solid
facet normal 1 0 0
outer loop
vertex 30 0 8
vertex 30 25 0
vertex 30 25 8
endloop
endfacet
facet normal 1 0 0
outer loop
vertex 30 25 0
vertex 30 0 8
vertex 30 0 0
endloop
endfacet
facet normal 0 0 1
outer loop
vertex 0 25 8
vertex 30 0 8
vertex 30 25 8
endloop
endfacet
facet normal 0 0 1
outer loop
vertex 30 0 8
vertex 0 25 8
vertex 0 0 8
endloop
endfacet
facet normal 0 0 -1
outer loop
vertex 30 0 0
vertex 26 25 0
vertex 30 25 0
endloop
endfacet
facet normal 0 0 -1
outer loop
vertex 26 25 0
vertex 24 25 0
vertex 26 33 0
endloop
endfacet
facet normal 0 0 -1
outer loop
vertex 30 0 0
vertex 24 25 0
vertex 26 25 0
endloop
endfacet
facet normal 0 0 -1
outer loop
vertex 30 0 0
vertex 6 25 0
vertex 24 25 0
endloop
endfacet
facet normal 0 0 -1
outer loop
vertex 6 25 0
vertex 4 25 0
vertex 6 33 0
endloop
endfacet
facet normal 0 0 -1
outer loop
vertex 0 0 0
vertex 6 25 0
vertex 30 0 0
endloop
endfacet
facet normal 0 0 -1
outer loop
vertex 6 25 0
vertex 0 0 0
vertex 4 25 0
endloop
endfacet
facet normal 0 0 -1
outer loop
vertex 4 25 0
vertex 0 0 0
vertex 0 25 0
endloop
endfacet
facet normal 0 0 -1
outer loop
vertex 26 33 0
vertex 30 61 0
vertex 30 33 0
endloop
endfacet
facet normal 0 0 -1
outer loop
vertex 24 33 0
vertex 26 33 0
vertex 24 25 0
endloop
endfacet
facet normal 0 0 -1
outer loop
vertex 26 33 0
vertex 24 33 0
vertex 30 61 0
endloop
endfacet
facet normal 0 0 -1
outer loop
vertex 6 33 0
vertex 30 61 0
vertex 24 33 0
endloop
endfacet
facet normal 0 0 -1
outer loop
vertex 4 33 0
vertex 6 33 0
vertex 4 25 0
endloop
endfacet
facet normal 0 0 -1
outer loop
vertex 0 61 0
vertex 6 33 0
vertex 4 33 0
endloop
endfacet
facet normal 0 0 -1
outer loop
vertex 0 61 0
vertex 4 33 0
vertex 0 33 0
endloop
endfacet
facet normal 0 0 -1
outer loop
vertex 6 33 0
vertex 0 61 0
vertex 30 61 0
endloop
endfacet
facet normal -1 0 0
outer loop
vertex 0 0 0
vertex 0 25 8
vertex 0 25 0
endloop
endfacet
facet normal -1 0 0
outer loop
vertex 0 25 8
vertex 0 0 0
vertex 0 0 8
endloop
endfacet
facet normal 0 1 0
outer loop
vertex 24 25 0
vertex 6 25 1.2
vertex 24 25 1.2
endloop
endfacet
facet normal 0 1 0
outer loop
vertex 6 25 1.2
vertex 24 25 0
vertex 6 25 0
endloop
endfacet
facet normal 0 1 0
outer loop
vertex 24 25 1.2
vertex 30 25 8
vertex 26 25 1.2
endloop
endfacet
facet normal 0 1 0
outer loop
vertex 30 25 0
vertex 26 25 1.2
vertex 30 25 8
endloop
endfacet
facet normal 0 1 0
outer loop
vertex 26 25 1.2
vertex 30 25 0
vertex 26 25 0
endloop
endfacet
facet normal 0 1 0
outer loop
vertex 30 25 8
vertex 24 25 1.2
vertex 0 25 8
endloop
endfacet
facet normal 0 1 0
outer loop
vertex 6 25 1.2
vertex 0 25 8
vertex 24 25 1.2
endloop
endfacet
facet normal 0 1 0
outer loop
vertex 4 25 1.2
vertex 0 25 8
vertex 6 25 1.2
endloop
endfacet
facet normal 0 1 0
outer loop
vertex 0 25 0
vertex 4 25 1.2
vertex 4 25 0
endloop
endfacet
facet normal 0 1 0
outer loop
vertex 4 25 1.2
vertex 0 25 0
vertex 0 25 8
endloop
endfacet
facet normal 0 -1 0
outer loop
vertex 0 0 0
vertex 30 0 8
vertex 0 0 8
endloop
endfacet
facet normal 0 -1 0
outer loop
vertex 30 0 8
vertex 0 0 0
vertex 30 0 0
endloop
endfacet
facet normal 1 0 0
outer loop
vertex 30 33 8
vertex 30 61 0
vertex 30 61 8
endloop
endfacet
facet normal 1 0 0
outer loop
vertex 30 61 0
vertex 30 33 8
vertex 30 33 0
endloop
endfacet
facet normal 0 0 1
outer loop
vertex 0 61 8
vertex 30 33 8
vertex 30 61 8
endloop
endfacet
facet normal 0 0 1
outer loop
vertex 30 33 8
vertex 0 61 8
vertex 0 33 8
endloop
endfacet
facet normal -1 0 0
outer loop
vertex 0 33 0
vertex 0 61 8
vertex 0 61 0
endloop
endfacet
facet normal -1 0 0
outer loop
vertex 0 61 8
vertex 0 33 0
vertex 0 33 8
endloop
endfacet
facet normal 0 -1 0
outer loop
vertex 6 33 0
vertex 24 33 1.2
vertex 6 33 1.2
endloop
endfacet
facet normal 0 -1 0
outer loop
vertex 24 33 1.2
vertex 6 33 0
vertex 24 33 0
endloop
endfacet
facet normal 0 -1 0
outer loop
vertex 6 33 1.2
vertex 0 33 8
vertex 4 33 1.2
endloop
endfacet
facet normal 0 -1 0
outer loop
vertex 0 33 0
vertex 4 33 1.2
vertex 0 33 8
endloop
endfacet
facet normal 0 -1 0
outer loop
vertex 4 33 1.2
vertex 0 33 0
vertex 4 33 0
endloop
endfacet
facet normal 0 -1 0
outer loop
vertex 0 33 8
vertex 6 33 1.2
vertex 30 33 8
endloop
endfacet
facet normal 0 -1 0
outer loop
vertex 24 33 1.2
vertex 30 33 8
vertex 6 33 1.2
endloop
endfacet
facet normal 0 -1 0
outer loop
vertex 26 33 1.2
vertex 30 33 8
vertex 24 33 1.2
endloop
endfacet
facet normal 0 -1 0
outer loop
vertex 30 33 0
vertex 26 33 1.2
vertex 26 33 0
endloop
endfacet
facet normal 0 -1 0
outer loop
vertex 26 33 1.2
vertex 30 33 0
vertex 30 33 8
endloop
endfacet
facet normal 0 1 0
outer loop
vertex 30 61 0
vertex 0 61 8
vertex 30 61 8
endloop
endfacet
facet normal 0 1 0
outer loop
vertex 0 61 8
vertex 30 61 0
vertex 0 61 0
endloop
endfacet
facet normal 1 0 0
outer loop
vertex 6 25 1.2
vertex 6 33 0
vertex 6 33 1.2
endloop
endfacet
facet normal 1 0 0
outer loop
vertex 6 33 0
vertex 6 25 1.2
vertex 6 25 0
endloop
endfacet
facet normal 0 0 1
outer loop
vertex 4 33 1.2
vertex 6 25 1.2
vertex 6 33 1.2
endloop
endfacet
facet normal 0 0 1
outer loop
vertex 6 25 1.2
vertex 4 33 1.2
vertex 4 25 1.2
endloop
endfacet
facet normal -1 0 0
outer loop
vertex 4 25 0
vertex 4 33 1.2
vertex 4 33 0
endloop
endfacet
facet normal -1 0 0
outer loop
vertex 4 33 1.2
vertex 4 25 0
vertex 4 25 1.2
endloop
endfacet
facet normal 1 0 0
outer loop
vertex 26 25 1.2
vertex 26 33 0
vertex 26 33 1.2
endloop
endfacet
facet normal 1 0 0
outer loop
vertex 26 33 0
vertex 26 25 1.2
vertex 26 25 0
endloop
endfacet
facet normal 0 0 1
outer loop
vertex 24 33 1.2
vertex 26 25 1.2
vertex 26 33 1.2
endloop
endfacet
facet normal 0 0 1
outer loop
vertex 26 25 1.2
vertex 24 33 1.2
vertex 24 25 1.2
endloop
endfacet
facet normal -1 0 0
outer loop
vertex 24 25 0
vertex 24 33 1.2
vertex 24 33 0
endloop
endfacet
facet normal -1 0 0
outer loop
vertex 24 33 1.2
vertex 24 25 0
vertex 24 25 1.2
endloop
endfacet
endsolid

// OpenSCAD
// Grass infinity wall - a tiled cyclorama for the lens saucer to hover over,
// with a half-formed crop circle pressed into it.
//
// THIS IS A TILED SET, NOT ONE OBJECT. At 300mm wide it is:
//   3x floor_tile   100 x 200 x 8      flat, trivial, huge first layer
//   3x cove_tile    100 x  70 x 130    the curve, solid, hollowed from below
//   1x seam_gauge   print FIRST - tests the tongue-and-groove fit
//
//   openscad --render -D 'part="seam_gauge"' -o gw_seam_gauge.stl infinity_wall.scad
//   openscad --render -D 'part="floor_tile"' -D tile=0 -o gw_floor_0.raw.stl infinity_wall.scad
//
// The floor tiles come out SMOOTH. The supplied gw_floor_N.stl also carry a
// grass texture over the standing crop, added afterwards in Blender by grass.py.
//
// view_assembly is a PICTURE.
//
// WHY TWO ROWS AND NOT ONE CURVE
//
// The saucer is 138mm across, so the floor has to be about 200mm deep for it
// to sit on with any foreground. 200 + a 70mm cove is 270mm, past the P1S's
// ~230mm practical bed - the corner exclusion zones refused a 240mm frame
// before. Splitting at the TANGENT costs one seam and buys the whole set:
// there is no visual feature at the tangent, the grass texture crosses it, and
// each row then prints in its own best orientation.
//
// WHY THE COVE IS SOLID AND NOT A SHELL
//
// The cove's underside sweeps from 0 to 90 degrees. A constant-thickness sheet
// would be a 90-degree overhang at the tangent - unprintable, and not the
// bridging kind: nothing is anchored on the far side. As a solid wedge sitting
// flat on the plate the same surface is the TOP, which costs nothing. It is
// then hollowed from beneath, where the cavity ceiling IS anchored both sides
// and bridges: a ceiling held at both ends prints, a cantilever does not.
//
// SHOT FROM ABOVE, WHICH CHANGES TWO THINGS.
//
// The cove row does nothing. An infinity curve exists to hide the horizon when
// the camera is low; from overhead the frame is floor and the wall is never
// seen. It is also 59% of the material and the three tallest parts, so the
// floor row alone is the print. cove_tile stays here for a low-angle shot.
//
// AND DEPTH ALONE WILL NOT READ. The reference is an aerial photograph and the
// formation shows up there by TONE - pale laid crop against golden standing
// crop - not by shadow. Straight down under soft light, a 2.5mm step casts
// almost none. So the contrast has to be COLOUR:
//
//     CHANGE FILAMENT AT Z = plate_t - crop_depth = 5.6mm
//
// Below it is laid crop, above it is standing crop. ONE swap at one layer,
// not the 16 that turned an 8g part into 20g - that warning is about colour
// changes per layer, and this is a single purge. Free on the H2D's two nozzles.
//
// THE FORMATION, from the reference: a hexagonal rosette. Six large
// overlapping circles around a small spoked hub, each carrying an angular
// meander glyph, with tractor tramlines crossing the field. Half-formed, so
// the glyphs stop partway round and the last circle is an empty outline.

part = "seam_gauge";  // seam_gauge | floor_tile | cove_tile | view_assembly
tile = 0;             // WHICH tile: 0..n_tiles-1. The formation spans the
                      // whole set, so a tile has to know where it sits or the
                      // pattern lands on all three in the same place.

layer_h = 0.2;
$fn     = 128;

// -------------------------------------------------------------- the subject
saucer_d  = 138;            // the saucer this set was built for, across its rim
saucer_h  = 40;

// ----------------------------------------------------------------- the set
set_w     = 300;            // total width, across all tiles
n_tiles   = 3;
tile_w    = set_w / n_tiles;

floor_d   = 200;            // deep enough for the saucer plus foreground
cove_r    = 70;             // blend radius: the "infinity" part
wall_h    = 60;             // vertical wall above the cove

plate_t   = 8;              // floor tile thickness
shell_t   = 6;              // cove tile skin over its cavity
rib_every = 40;             // ribs break the cavity ceiling into short bridges

// ------------------------------------------------------------- the seams
// Tongue and groove on the VERTICAL side faces. Vertical in both tiles' print
// orientations, so neither is an overhang. Loose on purpose - this is a set
// that gets assembled and pulled apart on a shoot, not a press fit.
tongue_w  = 4;
tongue_d  = 3;
seam_clr  = 0.35;

// ------------------------------------------------------------- assertions
assert(max(tile_w, floor_d) < 230,
       str("tile is ", max(tile_w, floor_d),
           "mm - the P1S practical bed is ~230, not the nominal 256"));
assert(cove_r + wall_h < 250, "cove tile is taller than the Z travel");
assert(floor_d > saucer_d + 40,
       str("floor is ", floor_d, "mm for a ", saucer_d,
           "mm saucer - no foreground left"));
assert(tongue_w >= 1.2 && tongue_d >= 1.2, "seam feature under the 1.2mm floor");
assert(shell_t >= 2.4, "cove skin thinner than 6 perimeters");

echo(str("FILAMENT CHANGE AT Z = ", plate_t - crop_depth,
         "mm - below is laid crop, above is standing crop"));
echo(str("set: ", n_tiles, " x ", tile_w, "mm wide, floor ", floor_d,
         "mm deep, cove r", cove_r, ", wall ", wall_h,
         " -> total depth ", floor_d + cove_r, ", height ", cove_r + wall_h));

// ==========================================================================

// The cove cross-section, as a closed r-z polygon sitting on the plate.
// Quarter arc from the tangent up to vertical, then the wall.
function cove_pts() = concat(
    [[0, 0]],
    [for (i = [0 : 48])
        let (a = 90 * i / 48)
            [cove_r * sin(a), cove_r * (1 - cos(a))]],
    [[cove_r, cove_r + wall_h],
     [cove_r + shell_t, cove_r + wall_h],
     [cove_r + shell_t, 0]]
);

module cove_solid() {
    rotate([90, 0, 0]) translate([0, 0, -tile_w])
        linear_extrude(tile_w) polygon(cove_pts());
}

// The cavity, offset in from the cove surface. Its ceiling is anchored on both
// sides, so it bridges - unlike the outside of the same curve, which is not.
module cove_cavity() {
    inner = concat(
        [[0, shell_t]],
        [for (i = [0 : 48])
            let (a = 90 * i / 48)
                [max(0, cove_r * sin(a) - shell_t),
                 cove_r * (1 - cos(a)) + shell_t]],
        [[cove_r - shell_t, cove_r + wall_h + 1],
         [0, cove_r + wall_h + 1]]
    );
    rotate([90, 0, 0]) translate([0, 0, -(tile_w - 2 * shell_t)])
        linear_extrude(tile_w - 2 * shell_t) polygon(inner);
}

module ribs() {
    n = floor(tile_w / rib_every);
    for (i = [1 : max(1, n)])
        translate([-1, i * tile_w / (n + 1) - 1.2, -1])
            cube([cove_r + shell_t + 2, 2.4, cove_r + wall_h + 2]);
}

// ------------------------------------------------------------- the seams
// A HALF LAP, not a butt joint with a spike on it.
//
// The first version put the groove at y = -3.35..0, which is OUTSIDE a tile
// whose body starts at y=0 - so it cut nothing, every tile grew a tongue with
// no socket to go in, and at 100mm pitch each tongue collided with the next
// tile's body. The set could not be assembled at all. Invisible in a white
// render and obvious the moment the tiles were drawn in position.
//
// So: the tongue is the BOTTOM HALF of the far edge, and the near edge has its
// bottom half removed to receive the neighbour's. They lap, the top faces stay
// coplanar, and the seam falls where the grass texture crosses it.
module tongue(h) {
    translate([-1, tile_w, 0])
        cube([floor_d + cove_r + 2, tongue_d, h / 2]);
}
module groove(h) {
    translate([-1, -1, -1])
        cube([floor_d + cove_r + 2, tongue_d + seam_clr + 1, h / 2 + 1]);
}

// -------------------------------------------------------------- floor tile
// Prints flat. First layer is the whole tile - the best available, and a big
// flat one, so brim 5mm with brim-object gap 0.
// NUMBER THE TILES ON THE UNDERSIDE.
//
// The half lap keys ORIENTATION - a tile physically cannot go in backwards -
// but it does not key SEQUENCE. Nothing stops 0, 2, 1, and the formation would
// simply be wrong with no obvious culprit. Recessed into the bottom face,
// where it is never in shot and costs nothing.
module tile_number(idx) {
    translate([28, tile_w / 2, -1])
        linear_extrude(2.6)
            text(str(idx), size = 26, halign = "center", valign = "center",
                 font = "DejaVu Sans:style=Bold");
}

module floor_tile(idx = 0) {
    difference() {
        union() {
            cube([floor_d, tile_w, plate_t]);
            intersection() {
                tongue(plate_t);
                cube([floor_d, tile_w + tongue_d, plate_t]);
            }
        }
        groove(plate_t);
        translate([0, -idx * tile_w, 0]) crop_circle();
        tile_number(idx);
    }
}

// --------------------------------------------------------------- cove tile
// Prints with its flat underside on the plate, so the curve is the TOP.
module cove_tile() {
    difference() {
        union() {
            cove_solid();
            intersection() {
                tongue(cove_r + wall_h);
                translate([0, 0, 0])
                    cube([cove_r + shell_t, tile_w + tongue_d, cove_r + wall_h]);
            }
        }
        difference() { cove_cavity(); ribs(); }
        groove(cove_r + wall_h);
    }
}

// -------------------------------------------------------------- seam gauge
// Print this FIRST. Two stubs, one of each half, so the tongue-and-groove
// clearance is proved for ten minutes of plate time instead of after three
// hours of tiles.
module seam_gauge() {
    d = 30;
    difference() {
        cube([d, tile_w / 4, plate_t]);
        translate([0, -tongue_d - seam_clr, -1])
            cube([d + 1, tongue_d + seam_clr, plate_t + 2]);
    }
    translate([0, tile_w / 4 + 8, 0]) {
        cube([d, tile_w / 4, plate_t]);
        translate([0, tile_w / 4, 0]) cube([d, tongue_d, plate_t]);
    }
    // Snap-off bridges. Two separate stubs lint as separate bodies and print
    // as two objects; joined, it is one print you break apart to test.
    for (x = [4, d - 6])
        translate([x, tile_w / 4, 0]) cube([2, 8, 1.2]);
}

// ------------------------------------------------------- THE CROP CIRCLE
// A hexagonal rosette, from the reference photograph.
//
// RECESSED, not raised: a crop circle is flattened crop, and recesses survive
// at this scale where protrusions curl off. 2.5mm deep because under 1.5mm
// vanishes into the layer lines and 2mm+ reads as shadow.
//
// HALF-FORMED. `formed` sweeps round the six circles: complete ones with their
// glyphs, then a bare outline where the pattern is still being pressed, then
// nothing. The saucer is doing this now, and the eye reads the gap as motion.
// 2.4, not 2.5, so the recess floor lands on a LAYER BOUNDARY: 8 - 2.4 = 5.6
// = exactly 28 layers at 0.2mm. The colour change has to happen at that floor
// or the two tones will not line up with the geometry, and a swap the slicer
// rounds to the nearest layer would leave a stripe of the wrong green.
crop_depth = 2.4;

// CENTRED ON WHAT IS ACTUALLY DRAWN, not on the notional rosette centre.
// Only 3.5 of the 6 circles exist, so the rosette's geometric middle is not
// where the ink is: the drawn parts span local x -64.5..95, whose centre is
// +15.25. Placing the formation at the floor's centre therefore pushed it
// visibly low and right. Offsetting by that centroid squares it up, and still
// leaves ~20mm of field on both sides.
form_x     = floor_d * 0.5 - 15.25;
form_y     = set_w / 2;
ring_r     = 34;               // one of the six circles
ring_c     = 61;               // its centre, out from the middle
hub_r      = 13;
formed     = 0.62;             // 0..1 round the rosette
sweep      = 0.55;             // how far the in-progress circle has got
// The formed circles run from angle 0 upward, so without this the whole
// rosette crowds into one half of the set and the first tile gets nothing but
// a tramline. Rotating by half the formed arc straddles it across the middle.
form_rot   = -60;

glyph_w    = 46;
glyph_h    = 32;
glyph_st   = 3.5;              // stroke
glyph_gap  = 3.5;              // and the GAP obeys the same 1.2mm floor as the
                               // stroke - features much closer than that merge
                               // in the slicer, and nothing warns about it
tram_w     = 4.5;              // tractor tramlines
tram_pitch = 78;
// SHALLOWER THAN THE FORMATION, and deliberately so. At full depth the
// tramlines break through the filament change and print pure white, which made
// them the loudest thing in the frame - bolder than the formation and bolder
// than they are in any real aerial photograph. At 1.5mm their floor sits at
// 6.5mm, ABOVE the swap at 5.6, so they stay the standing crop's colour and
// read as tracks pressed into the crop instead of laid lanes.
tram_depth = 1.5;

assert(glyph_st >= 1.2 && glyph_gap >= 1.2,
       str("glyph stroke ", glyph_st, " / gap ", glyph_gap,
           " - one of them is under the 1.2mm floor and they will merge"));
assert(crop_depth >= 2.0,
       str(crop_depth, "mm deep - under 2mm it stops reading as shadow"));
// The two-tone swap only works if the recess floor IS a layer boundary.
assert(abs((plate_t - crop_depth) / layer_h
           - round((plate_t - crop_depth) / layer_h)) < 1e-6,
       str("recess floor at ", plate_t - crop_depth, "mm is ",
           (plate_t - crop_depth) / layer_h, " layers at ", layer_h,
           " - not a whole number, so the filament change cannot land on it"));
assert(ring_c + ring_r < floor_d / 2,
       str("formation is ", 2 * (ring_c + ring_r),
           "mm across but the floor is only ", floor_d, "mm deep"));
assert(ring_c < 2 * ring_r,
       "circles do not overlap - the reference rosette has them intersecting");
assert(plate_t - tram_depth > plate_t - crop_depth,
       "tramlines are cut deeper than the formation");
assert(tram_depth >= 1.2, "tramline shallower than the 1.2mm feature floor");

// Nested C-shapes with alternating openings: the angular meander inside each
// circle. Three is as many as fits before the gap drops under the floor.
module glyph_2d() {
    n = floor(min(glyph_w, glyph_h) / (2 * (glyph_st + glyph_gap)));
    for (i = [0 : n - 1]) {
        iw = glyph_w - i * 2 * (glyph_st + glyph_gap);
        ih = glyph_h - i * 2 * (glyph_st + glyph_gap);
        if (iw > 2.5 * glyph_st && ih > 2.5 * glyph_st)
            difference() {
                square([iw, ih], center = true);
                square([iw - 2 * glyph_st, ih - 2 * glyph_st], center = true);
                translate([(i % 2 ? 1 : -1) * iw / 2, 0])
                    square([2 * glyph_st, ih * 0.42], center = true);
            }
    }
}

// The hub: a flattened disc with the spokes left STANDING inside it.
module hub_2d() {
    difference() {
        circle(hub_r);
        for (a = [0 : 45 : 359])
            rotate([0, 0, a]) translate([hub_r / 2, 0])
                square([hub_r, 2.6], center = true);
    }
}

// A pie wedge, for the circle still being swept out.
module wedge_2d(r, deg) {
    n = max(3, ceil(deg / 10));
    polygon(concat([[0, 0]],
        [for (i = [0 : n]) let (a = deg * i / n) [r * cos(a), r * sin(a)]]));
}

// THE CROP IS FLATTENED, THE GLYPH IS LEFT STANDING.
//
// Modelled the other way round first - thin ring grooves - and the shaded
// render caught it before it cost a plate. In the reference the six circles
// are PALE, which is laid crop, and the angular glyph inside each is DARK,
// which is crop still standing. So the disc is the recess and the meander is
// an island in the middle of it. Flat viewport shading would have hidden this
// completely.
module formation_2d() {
    complete = floor(formed * 6);
    rotate([0, 0, form_rot]) {
    hub_2d();
    for (i = [0 : 5]) {
        a = i * 60;
        if (i < complete)
            rotate([0, 0, a]) translate([ring_c, 0])
                difference() {
                    circle(ring_r);
                    rotate([0, 0, -a]) glyph_2d();
                }
        else if (i == complete)
            // Being pressed right now: swept partway round, no glyph yet.
            rotate([0, 0, a]) translate([ring_c, 0])
                rotate([0, 0, 130]) wedge_2d(ring_r, 360 * sweep);
    }
    }
}

module tramlines_2d() {
    for (i = [-2 : 2])
        translate([0, i * tram_pitch])
            rotate([0, 0, 7])            // tractors never drive quite square
                square([floor_d * 3, tram_w], center = true);
}

module crop_circle() {
    // The formation, full depth, through the colour change.
    translate([form_x, form_y, plate_t - crop_depth])
        linear_extrude(crop_depth + 1) formation_2d();
    // The tramlines, shallower, staying above it.
    translate([form_x, form_y, plate_t - tram_depth])
        linear_extrude(tram_depth + 1)
            intersection() {
                tramlines_2d();
                square([floor_d * 3, set_w * 3], center = true);
            }
}

// ------------------------------------------------------------------ views
// The floor row alone, flat. This is the view that judges the FORMATION -
// the oblique assembly shot flattens it into nothing.
module view_floor() {
    for (i = [0 : n_tiles - 1]) translate([0, i * tile_w, 0]) floor_tile(i);
}

module view_assembly() {
    for (i = [0 : n_tiles - 1]) translate([0, i * tile_w, 0]) {
        color("darkseagreen") floor_tile(i);
        translate([floor_d, 0, 0]) color("olivedrab") cove_tile();
    }
    %translate([floor_d * 0.55, set_w / 2, saucer_h / 2])
        scale([1, 1, 0.3]) sphere(d = saucer_d);
}

if      (part == "floor_tile")    floor_tile(tile);
else if (part == "cove_tile")     cove_tile();
else if (part == "seam_gauge")    seam_gauge();
else if (part == "view_floor")    view_floor();
else if (part == "view_assembly") view_assembly();
else assert(false, str("unknown part: ", part));
